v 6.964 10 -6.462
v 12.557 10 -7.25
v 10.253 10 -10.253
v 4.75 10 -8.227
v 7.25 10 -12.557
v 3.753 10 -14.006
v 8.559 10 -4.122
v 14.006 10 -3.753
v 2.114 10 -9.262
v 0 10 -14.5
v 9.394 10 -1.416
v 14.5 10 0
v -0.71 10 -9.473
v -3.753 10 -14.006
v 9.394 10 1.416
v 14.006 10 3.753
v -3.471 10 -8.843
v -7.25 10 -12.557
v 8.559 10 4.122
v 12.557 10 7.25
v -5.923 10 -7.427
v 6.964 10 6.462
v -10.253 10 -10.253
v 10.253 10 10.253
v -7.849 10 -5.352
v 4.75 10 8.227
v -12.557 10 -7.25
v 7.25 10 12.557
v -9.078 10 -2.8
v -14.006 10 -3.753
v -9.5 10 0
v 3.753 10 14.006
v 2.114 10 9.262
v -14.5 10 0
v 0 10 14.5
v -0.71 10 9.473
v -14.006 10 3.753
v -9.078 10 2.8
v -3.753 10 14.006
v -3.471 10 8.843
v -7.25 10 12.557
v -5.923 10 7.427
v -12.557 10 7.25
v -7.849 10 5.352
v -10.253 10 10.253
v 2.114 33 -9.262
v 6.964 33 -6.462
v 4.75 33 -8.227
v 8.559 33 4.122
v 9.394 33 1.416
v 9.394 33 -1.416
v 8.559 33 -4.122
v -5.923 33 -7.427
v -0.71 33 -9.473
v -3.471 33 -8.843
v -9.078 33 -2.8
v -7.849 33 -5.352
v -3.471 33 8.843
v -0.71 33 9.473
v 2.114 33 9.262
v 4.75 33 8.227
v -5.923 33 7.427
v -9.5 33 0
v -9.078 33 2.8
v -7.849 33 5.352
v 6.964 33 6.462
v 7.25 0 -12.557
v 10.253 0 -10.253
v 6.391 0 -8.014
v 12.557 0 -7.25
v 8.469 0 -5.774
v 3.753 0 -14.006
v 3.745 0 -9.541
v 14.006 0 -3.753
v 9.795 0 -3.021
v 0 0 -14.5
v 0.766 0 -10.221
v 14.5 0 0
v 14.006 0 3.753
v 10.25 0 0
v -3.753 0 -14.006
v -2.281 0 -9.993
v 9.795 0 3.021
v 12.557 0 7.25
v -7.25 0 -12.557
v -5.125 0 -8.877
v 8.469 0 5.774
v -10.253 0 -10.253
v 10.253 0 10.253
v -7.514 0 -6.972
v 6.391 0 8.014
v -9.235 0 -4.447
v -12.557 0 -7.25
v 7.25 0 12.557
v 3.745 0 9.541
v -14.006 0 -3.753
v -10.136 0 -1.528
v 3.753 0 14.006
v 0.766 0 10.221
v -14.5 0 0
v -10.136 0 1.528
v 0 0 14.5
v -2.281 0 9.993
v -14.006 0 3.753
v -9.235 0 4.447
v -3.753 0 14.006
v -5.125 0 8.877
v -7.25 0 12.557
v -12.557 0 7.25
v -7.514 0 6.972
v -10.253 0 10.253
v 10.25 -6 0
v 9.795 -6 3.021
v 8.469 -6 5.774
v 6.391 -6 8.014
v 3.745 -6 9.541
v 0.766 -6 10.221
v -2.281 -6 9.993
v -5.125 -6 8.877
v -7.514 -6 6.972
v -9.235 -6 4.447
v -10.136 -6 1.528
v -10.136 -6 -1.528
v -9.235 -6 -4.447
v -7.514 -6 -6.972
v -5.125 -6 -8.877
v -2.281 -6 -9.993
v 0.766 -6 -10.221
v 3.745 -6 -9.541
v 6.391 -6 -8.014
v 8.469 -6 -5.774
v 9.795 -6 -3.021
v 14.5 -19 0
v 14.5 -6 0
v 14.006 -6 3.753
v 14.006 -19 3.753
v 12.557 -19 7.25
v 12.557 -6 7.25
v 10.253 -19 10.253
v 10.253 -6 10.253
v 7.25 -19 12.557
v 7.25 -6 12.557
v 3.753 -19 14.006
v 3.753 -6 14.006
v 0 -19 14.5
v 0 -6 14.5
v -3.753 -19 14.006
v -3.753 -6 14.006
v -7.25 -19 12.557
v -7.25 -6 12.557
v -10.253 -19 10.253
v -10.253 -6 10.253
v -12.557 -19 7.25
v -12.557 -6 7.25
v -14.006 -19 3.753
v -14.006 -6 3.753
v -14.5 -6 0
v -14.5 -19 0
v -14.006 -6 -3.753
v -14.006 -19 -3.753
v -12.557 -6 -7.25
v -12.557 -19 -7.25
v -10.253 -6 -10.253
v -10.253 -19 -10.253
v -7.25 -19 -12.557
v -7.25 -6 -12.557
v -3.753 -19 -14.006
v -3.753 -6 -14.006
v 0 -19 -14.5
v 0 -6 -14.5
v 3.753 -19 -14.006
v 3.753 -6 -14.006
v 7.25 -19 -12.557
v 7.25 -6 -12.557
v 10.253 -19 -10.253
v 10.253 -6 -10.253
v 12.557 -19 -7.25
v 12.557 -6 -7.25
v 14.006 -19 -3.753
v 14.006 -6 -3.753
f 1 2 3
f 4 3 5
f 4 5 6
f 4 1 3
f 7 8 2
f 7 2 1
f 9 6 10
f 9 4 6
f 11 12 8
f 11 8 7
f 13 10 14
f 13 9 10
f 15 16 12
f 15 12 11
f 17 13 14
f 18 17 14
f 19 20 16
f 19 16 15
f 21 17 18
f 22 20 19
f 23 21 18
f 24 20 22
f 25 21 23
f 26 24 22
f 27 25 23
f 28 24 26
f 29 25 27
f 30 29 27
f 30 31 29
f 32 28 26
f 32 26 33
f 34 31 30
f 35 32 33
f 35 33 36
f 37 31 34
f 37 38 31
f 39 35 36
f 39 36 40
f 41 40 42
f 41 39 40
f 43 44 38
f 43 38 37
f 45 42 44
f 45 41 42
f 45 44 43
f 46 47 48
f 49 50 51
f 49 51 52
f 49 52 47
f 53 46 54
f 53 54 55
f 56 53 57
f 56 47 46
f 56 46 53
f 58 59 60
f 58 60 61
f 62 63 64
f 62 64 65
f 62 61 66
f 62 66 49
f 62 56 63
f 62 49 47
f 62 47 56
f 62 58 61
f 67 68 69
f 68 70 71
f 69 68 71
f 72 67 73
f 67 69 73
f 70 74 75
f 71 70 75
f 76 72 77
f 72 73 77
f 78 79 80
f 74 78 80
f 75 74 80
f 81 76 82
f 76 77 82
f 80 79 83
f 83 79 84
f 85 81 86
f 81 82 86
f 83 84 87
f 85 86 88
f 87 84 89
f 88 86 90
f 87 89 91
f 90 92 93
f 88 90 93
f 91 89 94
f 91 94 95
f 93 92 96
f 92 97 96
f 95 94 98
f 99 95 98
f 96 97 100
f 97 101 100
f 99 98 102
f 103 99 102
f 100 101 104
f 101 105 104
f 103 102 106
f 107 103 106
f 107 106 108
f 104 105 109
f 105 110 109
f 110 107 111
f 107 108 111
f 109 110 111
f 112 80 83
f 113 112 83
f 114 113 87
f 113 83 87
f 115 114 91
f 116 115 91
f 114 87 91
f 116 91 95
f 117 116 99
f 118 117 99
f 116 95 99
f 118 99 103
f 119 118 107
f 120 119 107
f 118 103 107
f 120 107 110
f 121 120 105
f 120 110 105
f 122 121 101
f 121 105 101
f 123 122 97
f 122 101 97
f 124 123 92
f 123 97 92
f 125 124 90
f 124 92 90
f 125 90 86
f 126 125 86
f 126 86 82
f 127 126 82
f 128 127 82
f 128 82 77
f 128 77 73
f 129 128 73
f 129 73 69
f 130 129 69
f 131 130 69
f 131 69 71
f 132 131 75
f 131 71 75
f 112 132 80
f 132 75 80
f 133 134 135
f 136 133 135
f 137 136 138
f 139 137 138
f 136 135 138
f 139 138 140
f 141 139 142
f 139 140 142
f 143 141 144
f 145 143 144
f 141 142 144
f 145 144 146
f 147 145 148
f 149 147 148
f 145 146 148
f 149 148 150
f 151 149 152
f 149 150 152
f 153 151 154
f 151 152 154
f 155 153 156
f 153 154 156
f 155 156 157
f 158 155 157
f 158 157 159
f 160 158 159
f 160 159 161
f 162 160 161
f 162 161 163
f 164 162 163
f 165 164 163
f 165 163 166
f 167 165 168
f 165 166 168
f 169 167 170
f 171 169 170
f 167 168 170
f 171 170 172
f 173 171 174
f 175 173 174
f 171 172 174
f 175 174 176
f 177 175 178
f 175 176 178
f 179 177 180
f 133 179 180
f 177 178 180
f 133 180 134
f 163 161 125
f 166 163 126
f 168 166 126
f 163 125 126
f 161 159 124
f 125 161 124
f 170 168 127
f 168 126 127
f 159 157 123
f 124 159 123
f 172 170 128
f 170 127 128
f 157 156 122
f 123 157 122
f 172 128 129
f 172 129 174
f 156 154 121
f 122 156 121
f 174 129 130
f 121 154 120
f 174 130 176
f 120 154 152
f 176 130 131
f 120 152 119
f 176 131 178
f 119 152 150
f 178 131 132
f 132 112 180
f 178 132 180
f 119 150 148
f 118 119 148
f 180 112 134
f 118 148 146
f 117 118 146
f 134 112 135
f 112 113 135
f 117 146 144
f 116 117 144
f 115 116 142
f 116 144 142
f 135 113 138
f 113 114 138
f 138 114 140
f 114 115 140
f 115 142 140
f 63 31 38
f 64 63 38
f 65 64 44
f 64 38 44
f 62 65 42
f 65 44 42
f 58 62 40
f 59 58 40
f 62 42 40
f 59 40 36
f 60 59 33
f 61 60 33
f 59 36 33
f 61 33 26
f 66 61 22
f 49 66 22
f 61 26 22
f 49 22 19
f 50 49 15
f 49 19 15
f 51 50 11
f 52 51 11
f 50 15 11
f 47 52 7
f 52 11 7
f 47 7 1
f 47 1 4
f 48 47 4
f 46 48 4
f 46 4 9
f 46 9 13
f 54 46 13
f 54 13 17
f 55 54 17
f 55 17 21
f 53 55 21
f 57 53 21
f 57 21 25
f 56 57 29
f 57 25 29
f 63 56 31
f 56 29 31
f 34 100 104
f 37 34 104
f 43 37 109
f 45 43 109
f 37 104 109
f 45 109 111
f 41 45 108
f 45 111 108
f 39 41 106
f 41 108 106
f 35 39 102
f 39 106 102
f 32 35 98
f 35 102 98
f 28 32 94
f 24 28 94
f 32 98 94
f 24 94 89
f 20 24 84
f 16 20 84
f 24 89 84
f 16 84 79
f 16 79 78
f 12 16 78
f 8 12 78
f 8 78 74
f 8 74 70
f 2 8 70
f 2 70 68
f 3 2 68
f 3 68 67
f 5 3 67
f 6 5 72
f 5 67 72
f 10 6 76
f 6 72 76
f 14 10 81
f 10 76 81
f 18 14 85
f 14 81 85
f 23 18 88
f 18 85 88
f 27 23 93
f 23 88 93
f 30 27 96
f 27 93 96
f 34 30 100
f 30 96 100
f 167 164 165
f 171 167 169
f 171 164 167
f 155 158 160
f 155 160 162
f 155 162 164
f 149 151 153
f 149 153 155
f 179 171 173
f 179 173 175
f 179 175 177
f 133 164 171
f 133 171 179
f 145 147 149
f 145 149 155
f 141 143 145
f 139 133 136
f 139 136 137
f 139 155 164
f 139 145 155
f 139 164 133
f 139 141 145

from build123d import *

# Parameters (mm, degrees)
F0_R     = 10.25
F1_DEPTH = 6
F2_R     = 14.5
F3_DEPTH = 13
F4_R     = 14.5
F5_DEPTH = 10
F6_R     = 9.5
F7_DEPTH = 23


with BuildPart() as f1:
    # F0 (on Front) → F1 (new body)
    with BuildSketch(Plane.XZ):
        Circle(F0_R)
    extrude(amount=F1_DEPTH)

    # F2 (on face) → F3 (join)
    with BuildSketch(Plane.XZ.offset(6)):
        Circle(F2_R)
    extrude(amount=F3_DEPTH)

    # F4 (on face) → F5 (join)
    with BuildSketch(Plane(origin=(0, 0, 0), x_dir=(-1, 0, 0), z_dir=(0, 1, 0))):
        Circle(F4_R)
    extrude(amount=F5_DEPTH)

    # F6 (on face) → F7 (join)
    with BuildSketch(Plane(origin=(0, 10, 0), x_dir=(-1, 0, 0), z_dir=(0, 1, 0))):
        Circle(F6_R)
    extrude(amount=F7_DEPTH)


solid = f1.part
